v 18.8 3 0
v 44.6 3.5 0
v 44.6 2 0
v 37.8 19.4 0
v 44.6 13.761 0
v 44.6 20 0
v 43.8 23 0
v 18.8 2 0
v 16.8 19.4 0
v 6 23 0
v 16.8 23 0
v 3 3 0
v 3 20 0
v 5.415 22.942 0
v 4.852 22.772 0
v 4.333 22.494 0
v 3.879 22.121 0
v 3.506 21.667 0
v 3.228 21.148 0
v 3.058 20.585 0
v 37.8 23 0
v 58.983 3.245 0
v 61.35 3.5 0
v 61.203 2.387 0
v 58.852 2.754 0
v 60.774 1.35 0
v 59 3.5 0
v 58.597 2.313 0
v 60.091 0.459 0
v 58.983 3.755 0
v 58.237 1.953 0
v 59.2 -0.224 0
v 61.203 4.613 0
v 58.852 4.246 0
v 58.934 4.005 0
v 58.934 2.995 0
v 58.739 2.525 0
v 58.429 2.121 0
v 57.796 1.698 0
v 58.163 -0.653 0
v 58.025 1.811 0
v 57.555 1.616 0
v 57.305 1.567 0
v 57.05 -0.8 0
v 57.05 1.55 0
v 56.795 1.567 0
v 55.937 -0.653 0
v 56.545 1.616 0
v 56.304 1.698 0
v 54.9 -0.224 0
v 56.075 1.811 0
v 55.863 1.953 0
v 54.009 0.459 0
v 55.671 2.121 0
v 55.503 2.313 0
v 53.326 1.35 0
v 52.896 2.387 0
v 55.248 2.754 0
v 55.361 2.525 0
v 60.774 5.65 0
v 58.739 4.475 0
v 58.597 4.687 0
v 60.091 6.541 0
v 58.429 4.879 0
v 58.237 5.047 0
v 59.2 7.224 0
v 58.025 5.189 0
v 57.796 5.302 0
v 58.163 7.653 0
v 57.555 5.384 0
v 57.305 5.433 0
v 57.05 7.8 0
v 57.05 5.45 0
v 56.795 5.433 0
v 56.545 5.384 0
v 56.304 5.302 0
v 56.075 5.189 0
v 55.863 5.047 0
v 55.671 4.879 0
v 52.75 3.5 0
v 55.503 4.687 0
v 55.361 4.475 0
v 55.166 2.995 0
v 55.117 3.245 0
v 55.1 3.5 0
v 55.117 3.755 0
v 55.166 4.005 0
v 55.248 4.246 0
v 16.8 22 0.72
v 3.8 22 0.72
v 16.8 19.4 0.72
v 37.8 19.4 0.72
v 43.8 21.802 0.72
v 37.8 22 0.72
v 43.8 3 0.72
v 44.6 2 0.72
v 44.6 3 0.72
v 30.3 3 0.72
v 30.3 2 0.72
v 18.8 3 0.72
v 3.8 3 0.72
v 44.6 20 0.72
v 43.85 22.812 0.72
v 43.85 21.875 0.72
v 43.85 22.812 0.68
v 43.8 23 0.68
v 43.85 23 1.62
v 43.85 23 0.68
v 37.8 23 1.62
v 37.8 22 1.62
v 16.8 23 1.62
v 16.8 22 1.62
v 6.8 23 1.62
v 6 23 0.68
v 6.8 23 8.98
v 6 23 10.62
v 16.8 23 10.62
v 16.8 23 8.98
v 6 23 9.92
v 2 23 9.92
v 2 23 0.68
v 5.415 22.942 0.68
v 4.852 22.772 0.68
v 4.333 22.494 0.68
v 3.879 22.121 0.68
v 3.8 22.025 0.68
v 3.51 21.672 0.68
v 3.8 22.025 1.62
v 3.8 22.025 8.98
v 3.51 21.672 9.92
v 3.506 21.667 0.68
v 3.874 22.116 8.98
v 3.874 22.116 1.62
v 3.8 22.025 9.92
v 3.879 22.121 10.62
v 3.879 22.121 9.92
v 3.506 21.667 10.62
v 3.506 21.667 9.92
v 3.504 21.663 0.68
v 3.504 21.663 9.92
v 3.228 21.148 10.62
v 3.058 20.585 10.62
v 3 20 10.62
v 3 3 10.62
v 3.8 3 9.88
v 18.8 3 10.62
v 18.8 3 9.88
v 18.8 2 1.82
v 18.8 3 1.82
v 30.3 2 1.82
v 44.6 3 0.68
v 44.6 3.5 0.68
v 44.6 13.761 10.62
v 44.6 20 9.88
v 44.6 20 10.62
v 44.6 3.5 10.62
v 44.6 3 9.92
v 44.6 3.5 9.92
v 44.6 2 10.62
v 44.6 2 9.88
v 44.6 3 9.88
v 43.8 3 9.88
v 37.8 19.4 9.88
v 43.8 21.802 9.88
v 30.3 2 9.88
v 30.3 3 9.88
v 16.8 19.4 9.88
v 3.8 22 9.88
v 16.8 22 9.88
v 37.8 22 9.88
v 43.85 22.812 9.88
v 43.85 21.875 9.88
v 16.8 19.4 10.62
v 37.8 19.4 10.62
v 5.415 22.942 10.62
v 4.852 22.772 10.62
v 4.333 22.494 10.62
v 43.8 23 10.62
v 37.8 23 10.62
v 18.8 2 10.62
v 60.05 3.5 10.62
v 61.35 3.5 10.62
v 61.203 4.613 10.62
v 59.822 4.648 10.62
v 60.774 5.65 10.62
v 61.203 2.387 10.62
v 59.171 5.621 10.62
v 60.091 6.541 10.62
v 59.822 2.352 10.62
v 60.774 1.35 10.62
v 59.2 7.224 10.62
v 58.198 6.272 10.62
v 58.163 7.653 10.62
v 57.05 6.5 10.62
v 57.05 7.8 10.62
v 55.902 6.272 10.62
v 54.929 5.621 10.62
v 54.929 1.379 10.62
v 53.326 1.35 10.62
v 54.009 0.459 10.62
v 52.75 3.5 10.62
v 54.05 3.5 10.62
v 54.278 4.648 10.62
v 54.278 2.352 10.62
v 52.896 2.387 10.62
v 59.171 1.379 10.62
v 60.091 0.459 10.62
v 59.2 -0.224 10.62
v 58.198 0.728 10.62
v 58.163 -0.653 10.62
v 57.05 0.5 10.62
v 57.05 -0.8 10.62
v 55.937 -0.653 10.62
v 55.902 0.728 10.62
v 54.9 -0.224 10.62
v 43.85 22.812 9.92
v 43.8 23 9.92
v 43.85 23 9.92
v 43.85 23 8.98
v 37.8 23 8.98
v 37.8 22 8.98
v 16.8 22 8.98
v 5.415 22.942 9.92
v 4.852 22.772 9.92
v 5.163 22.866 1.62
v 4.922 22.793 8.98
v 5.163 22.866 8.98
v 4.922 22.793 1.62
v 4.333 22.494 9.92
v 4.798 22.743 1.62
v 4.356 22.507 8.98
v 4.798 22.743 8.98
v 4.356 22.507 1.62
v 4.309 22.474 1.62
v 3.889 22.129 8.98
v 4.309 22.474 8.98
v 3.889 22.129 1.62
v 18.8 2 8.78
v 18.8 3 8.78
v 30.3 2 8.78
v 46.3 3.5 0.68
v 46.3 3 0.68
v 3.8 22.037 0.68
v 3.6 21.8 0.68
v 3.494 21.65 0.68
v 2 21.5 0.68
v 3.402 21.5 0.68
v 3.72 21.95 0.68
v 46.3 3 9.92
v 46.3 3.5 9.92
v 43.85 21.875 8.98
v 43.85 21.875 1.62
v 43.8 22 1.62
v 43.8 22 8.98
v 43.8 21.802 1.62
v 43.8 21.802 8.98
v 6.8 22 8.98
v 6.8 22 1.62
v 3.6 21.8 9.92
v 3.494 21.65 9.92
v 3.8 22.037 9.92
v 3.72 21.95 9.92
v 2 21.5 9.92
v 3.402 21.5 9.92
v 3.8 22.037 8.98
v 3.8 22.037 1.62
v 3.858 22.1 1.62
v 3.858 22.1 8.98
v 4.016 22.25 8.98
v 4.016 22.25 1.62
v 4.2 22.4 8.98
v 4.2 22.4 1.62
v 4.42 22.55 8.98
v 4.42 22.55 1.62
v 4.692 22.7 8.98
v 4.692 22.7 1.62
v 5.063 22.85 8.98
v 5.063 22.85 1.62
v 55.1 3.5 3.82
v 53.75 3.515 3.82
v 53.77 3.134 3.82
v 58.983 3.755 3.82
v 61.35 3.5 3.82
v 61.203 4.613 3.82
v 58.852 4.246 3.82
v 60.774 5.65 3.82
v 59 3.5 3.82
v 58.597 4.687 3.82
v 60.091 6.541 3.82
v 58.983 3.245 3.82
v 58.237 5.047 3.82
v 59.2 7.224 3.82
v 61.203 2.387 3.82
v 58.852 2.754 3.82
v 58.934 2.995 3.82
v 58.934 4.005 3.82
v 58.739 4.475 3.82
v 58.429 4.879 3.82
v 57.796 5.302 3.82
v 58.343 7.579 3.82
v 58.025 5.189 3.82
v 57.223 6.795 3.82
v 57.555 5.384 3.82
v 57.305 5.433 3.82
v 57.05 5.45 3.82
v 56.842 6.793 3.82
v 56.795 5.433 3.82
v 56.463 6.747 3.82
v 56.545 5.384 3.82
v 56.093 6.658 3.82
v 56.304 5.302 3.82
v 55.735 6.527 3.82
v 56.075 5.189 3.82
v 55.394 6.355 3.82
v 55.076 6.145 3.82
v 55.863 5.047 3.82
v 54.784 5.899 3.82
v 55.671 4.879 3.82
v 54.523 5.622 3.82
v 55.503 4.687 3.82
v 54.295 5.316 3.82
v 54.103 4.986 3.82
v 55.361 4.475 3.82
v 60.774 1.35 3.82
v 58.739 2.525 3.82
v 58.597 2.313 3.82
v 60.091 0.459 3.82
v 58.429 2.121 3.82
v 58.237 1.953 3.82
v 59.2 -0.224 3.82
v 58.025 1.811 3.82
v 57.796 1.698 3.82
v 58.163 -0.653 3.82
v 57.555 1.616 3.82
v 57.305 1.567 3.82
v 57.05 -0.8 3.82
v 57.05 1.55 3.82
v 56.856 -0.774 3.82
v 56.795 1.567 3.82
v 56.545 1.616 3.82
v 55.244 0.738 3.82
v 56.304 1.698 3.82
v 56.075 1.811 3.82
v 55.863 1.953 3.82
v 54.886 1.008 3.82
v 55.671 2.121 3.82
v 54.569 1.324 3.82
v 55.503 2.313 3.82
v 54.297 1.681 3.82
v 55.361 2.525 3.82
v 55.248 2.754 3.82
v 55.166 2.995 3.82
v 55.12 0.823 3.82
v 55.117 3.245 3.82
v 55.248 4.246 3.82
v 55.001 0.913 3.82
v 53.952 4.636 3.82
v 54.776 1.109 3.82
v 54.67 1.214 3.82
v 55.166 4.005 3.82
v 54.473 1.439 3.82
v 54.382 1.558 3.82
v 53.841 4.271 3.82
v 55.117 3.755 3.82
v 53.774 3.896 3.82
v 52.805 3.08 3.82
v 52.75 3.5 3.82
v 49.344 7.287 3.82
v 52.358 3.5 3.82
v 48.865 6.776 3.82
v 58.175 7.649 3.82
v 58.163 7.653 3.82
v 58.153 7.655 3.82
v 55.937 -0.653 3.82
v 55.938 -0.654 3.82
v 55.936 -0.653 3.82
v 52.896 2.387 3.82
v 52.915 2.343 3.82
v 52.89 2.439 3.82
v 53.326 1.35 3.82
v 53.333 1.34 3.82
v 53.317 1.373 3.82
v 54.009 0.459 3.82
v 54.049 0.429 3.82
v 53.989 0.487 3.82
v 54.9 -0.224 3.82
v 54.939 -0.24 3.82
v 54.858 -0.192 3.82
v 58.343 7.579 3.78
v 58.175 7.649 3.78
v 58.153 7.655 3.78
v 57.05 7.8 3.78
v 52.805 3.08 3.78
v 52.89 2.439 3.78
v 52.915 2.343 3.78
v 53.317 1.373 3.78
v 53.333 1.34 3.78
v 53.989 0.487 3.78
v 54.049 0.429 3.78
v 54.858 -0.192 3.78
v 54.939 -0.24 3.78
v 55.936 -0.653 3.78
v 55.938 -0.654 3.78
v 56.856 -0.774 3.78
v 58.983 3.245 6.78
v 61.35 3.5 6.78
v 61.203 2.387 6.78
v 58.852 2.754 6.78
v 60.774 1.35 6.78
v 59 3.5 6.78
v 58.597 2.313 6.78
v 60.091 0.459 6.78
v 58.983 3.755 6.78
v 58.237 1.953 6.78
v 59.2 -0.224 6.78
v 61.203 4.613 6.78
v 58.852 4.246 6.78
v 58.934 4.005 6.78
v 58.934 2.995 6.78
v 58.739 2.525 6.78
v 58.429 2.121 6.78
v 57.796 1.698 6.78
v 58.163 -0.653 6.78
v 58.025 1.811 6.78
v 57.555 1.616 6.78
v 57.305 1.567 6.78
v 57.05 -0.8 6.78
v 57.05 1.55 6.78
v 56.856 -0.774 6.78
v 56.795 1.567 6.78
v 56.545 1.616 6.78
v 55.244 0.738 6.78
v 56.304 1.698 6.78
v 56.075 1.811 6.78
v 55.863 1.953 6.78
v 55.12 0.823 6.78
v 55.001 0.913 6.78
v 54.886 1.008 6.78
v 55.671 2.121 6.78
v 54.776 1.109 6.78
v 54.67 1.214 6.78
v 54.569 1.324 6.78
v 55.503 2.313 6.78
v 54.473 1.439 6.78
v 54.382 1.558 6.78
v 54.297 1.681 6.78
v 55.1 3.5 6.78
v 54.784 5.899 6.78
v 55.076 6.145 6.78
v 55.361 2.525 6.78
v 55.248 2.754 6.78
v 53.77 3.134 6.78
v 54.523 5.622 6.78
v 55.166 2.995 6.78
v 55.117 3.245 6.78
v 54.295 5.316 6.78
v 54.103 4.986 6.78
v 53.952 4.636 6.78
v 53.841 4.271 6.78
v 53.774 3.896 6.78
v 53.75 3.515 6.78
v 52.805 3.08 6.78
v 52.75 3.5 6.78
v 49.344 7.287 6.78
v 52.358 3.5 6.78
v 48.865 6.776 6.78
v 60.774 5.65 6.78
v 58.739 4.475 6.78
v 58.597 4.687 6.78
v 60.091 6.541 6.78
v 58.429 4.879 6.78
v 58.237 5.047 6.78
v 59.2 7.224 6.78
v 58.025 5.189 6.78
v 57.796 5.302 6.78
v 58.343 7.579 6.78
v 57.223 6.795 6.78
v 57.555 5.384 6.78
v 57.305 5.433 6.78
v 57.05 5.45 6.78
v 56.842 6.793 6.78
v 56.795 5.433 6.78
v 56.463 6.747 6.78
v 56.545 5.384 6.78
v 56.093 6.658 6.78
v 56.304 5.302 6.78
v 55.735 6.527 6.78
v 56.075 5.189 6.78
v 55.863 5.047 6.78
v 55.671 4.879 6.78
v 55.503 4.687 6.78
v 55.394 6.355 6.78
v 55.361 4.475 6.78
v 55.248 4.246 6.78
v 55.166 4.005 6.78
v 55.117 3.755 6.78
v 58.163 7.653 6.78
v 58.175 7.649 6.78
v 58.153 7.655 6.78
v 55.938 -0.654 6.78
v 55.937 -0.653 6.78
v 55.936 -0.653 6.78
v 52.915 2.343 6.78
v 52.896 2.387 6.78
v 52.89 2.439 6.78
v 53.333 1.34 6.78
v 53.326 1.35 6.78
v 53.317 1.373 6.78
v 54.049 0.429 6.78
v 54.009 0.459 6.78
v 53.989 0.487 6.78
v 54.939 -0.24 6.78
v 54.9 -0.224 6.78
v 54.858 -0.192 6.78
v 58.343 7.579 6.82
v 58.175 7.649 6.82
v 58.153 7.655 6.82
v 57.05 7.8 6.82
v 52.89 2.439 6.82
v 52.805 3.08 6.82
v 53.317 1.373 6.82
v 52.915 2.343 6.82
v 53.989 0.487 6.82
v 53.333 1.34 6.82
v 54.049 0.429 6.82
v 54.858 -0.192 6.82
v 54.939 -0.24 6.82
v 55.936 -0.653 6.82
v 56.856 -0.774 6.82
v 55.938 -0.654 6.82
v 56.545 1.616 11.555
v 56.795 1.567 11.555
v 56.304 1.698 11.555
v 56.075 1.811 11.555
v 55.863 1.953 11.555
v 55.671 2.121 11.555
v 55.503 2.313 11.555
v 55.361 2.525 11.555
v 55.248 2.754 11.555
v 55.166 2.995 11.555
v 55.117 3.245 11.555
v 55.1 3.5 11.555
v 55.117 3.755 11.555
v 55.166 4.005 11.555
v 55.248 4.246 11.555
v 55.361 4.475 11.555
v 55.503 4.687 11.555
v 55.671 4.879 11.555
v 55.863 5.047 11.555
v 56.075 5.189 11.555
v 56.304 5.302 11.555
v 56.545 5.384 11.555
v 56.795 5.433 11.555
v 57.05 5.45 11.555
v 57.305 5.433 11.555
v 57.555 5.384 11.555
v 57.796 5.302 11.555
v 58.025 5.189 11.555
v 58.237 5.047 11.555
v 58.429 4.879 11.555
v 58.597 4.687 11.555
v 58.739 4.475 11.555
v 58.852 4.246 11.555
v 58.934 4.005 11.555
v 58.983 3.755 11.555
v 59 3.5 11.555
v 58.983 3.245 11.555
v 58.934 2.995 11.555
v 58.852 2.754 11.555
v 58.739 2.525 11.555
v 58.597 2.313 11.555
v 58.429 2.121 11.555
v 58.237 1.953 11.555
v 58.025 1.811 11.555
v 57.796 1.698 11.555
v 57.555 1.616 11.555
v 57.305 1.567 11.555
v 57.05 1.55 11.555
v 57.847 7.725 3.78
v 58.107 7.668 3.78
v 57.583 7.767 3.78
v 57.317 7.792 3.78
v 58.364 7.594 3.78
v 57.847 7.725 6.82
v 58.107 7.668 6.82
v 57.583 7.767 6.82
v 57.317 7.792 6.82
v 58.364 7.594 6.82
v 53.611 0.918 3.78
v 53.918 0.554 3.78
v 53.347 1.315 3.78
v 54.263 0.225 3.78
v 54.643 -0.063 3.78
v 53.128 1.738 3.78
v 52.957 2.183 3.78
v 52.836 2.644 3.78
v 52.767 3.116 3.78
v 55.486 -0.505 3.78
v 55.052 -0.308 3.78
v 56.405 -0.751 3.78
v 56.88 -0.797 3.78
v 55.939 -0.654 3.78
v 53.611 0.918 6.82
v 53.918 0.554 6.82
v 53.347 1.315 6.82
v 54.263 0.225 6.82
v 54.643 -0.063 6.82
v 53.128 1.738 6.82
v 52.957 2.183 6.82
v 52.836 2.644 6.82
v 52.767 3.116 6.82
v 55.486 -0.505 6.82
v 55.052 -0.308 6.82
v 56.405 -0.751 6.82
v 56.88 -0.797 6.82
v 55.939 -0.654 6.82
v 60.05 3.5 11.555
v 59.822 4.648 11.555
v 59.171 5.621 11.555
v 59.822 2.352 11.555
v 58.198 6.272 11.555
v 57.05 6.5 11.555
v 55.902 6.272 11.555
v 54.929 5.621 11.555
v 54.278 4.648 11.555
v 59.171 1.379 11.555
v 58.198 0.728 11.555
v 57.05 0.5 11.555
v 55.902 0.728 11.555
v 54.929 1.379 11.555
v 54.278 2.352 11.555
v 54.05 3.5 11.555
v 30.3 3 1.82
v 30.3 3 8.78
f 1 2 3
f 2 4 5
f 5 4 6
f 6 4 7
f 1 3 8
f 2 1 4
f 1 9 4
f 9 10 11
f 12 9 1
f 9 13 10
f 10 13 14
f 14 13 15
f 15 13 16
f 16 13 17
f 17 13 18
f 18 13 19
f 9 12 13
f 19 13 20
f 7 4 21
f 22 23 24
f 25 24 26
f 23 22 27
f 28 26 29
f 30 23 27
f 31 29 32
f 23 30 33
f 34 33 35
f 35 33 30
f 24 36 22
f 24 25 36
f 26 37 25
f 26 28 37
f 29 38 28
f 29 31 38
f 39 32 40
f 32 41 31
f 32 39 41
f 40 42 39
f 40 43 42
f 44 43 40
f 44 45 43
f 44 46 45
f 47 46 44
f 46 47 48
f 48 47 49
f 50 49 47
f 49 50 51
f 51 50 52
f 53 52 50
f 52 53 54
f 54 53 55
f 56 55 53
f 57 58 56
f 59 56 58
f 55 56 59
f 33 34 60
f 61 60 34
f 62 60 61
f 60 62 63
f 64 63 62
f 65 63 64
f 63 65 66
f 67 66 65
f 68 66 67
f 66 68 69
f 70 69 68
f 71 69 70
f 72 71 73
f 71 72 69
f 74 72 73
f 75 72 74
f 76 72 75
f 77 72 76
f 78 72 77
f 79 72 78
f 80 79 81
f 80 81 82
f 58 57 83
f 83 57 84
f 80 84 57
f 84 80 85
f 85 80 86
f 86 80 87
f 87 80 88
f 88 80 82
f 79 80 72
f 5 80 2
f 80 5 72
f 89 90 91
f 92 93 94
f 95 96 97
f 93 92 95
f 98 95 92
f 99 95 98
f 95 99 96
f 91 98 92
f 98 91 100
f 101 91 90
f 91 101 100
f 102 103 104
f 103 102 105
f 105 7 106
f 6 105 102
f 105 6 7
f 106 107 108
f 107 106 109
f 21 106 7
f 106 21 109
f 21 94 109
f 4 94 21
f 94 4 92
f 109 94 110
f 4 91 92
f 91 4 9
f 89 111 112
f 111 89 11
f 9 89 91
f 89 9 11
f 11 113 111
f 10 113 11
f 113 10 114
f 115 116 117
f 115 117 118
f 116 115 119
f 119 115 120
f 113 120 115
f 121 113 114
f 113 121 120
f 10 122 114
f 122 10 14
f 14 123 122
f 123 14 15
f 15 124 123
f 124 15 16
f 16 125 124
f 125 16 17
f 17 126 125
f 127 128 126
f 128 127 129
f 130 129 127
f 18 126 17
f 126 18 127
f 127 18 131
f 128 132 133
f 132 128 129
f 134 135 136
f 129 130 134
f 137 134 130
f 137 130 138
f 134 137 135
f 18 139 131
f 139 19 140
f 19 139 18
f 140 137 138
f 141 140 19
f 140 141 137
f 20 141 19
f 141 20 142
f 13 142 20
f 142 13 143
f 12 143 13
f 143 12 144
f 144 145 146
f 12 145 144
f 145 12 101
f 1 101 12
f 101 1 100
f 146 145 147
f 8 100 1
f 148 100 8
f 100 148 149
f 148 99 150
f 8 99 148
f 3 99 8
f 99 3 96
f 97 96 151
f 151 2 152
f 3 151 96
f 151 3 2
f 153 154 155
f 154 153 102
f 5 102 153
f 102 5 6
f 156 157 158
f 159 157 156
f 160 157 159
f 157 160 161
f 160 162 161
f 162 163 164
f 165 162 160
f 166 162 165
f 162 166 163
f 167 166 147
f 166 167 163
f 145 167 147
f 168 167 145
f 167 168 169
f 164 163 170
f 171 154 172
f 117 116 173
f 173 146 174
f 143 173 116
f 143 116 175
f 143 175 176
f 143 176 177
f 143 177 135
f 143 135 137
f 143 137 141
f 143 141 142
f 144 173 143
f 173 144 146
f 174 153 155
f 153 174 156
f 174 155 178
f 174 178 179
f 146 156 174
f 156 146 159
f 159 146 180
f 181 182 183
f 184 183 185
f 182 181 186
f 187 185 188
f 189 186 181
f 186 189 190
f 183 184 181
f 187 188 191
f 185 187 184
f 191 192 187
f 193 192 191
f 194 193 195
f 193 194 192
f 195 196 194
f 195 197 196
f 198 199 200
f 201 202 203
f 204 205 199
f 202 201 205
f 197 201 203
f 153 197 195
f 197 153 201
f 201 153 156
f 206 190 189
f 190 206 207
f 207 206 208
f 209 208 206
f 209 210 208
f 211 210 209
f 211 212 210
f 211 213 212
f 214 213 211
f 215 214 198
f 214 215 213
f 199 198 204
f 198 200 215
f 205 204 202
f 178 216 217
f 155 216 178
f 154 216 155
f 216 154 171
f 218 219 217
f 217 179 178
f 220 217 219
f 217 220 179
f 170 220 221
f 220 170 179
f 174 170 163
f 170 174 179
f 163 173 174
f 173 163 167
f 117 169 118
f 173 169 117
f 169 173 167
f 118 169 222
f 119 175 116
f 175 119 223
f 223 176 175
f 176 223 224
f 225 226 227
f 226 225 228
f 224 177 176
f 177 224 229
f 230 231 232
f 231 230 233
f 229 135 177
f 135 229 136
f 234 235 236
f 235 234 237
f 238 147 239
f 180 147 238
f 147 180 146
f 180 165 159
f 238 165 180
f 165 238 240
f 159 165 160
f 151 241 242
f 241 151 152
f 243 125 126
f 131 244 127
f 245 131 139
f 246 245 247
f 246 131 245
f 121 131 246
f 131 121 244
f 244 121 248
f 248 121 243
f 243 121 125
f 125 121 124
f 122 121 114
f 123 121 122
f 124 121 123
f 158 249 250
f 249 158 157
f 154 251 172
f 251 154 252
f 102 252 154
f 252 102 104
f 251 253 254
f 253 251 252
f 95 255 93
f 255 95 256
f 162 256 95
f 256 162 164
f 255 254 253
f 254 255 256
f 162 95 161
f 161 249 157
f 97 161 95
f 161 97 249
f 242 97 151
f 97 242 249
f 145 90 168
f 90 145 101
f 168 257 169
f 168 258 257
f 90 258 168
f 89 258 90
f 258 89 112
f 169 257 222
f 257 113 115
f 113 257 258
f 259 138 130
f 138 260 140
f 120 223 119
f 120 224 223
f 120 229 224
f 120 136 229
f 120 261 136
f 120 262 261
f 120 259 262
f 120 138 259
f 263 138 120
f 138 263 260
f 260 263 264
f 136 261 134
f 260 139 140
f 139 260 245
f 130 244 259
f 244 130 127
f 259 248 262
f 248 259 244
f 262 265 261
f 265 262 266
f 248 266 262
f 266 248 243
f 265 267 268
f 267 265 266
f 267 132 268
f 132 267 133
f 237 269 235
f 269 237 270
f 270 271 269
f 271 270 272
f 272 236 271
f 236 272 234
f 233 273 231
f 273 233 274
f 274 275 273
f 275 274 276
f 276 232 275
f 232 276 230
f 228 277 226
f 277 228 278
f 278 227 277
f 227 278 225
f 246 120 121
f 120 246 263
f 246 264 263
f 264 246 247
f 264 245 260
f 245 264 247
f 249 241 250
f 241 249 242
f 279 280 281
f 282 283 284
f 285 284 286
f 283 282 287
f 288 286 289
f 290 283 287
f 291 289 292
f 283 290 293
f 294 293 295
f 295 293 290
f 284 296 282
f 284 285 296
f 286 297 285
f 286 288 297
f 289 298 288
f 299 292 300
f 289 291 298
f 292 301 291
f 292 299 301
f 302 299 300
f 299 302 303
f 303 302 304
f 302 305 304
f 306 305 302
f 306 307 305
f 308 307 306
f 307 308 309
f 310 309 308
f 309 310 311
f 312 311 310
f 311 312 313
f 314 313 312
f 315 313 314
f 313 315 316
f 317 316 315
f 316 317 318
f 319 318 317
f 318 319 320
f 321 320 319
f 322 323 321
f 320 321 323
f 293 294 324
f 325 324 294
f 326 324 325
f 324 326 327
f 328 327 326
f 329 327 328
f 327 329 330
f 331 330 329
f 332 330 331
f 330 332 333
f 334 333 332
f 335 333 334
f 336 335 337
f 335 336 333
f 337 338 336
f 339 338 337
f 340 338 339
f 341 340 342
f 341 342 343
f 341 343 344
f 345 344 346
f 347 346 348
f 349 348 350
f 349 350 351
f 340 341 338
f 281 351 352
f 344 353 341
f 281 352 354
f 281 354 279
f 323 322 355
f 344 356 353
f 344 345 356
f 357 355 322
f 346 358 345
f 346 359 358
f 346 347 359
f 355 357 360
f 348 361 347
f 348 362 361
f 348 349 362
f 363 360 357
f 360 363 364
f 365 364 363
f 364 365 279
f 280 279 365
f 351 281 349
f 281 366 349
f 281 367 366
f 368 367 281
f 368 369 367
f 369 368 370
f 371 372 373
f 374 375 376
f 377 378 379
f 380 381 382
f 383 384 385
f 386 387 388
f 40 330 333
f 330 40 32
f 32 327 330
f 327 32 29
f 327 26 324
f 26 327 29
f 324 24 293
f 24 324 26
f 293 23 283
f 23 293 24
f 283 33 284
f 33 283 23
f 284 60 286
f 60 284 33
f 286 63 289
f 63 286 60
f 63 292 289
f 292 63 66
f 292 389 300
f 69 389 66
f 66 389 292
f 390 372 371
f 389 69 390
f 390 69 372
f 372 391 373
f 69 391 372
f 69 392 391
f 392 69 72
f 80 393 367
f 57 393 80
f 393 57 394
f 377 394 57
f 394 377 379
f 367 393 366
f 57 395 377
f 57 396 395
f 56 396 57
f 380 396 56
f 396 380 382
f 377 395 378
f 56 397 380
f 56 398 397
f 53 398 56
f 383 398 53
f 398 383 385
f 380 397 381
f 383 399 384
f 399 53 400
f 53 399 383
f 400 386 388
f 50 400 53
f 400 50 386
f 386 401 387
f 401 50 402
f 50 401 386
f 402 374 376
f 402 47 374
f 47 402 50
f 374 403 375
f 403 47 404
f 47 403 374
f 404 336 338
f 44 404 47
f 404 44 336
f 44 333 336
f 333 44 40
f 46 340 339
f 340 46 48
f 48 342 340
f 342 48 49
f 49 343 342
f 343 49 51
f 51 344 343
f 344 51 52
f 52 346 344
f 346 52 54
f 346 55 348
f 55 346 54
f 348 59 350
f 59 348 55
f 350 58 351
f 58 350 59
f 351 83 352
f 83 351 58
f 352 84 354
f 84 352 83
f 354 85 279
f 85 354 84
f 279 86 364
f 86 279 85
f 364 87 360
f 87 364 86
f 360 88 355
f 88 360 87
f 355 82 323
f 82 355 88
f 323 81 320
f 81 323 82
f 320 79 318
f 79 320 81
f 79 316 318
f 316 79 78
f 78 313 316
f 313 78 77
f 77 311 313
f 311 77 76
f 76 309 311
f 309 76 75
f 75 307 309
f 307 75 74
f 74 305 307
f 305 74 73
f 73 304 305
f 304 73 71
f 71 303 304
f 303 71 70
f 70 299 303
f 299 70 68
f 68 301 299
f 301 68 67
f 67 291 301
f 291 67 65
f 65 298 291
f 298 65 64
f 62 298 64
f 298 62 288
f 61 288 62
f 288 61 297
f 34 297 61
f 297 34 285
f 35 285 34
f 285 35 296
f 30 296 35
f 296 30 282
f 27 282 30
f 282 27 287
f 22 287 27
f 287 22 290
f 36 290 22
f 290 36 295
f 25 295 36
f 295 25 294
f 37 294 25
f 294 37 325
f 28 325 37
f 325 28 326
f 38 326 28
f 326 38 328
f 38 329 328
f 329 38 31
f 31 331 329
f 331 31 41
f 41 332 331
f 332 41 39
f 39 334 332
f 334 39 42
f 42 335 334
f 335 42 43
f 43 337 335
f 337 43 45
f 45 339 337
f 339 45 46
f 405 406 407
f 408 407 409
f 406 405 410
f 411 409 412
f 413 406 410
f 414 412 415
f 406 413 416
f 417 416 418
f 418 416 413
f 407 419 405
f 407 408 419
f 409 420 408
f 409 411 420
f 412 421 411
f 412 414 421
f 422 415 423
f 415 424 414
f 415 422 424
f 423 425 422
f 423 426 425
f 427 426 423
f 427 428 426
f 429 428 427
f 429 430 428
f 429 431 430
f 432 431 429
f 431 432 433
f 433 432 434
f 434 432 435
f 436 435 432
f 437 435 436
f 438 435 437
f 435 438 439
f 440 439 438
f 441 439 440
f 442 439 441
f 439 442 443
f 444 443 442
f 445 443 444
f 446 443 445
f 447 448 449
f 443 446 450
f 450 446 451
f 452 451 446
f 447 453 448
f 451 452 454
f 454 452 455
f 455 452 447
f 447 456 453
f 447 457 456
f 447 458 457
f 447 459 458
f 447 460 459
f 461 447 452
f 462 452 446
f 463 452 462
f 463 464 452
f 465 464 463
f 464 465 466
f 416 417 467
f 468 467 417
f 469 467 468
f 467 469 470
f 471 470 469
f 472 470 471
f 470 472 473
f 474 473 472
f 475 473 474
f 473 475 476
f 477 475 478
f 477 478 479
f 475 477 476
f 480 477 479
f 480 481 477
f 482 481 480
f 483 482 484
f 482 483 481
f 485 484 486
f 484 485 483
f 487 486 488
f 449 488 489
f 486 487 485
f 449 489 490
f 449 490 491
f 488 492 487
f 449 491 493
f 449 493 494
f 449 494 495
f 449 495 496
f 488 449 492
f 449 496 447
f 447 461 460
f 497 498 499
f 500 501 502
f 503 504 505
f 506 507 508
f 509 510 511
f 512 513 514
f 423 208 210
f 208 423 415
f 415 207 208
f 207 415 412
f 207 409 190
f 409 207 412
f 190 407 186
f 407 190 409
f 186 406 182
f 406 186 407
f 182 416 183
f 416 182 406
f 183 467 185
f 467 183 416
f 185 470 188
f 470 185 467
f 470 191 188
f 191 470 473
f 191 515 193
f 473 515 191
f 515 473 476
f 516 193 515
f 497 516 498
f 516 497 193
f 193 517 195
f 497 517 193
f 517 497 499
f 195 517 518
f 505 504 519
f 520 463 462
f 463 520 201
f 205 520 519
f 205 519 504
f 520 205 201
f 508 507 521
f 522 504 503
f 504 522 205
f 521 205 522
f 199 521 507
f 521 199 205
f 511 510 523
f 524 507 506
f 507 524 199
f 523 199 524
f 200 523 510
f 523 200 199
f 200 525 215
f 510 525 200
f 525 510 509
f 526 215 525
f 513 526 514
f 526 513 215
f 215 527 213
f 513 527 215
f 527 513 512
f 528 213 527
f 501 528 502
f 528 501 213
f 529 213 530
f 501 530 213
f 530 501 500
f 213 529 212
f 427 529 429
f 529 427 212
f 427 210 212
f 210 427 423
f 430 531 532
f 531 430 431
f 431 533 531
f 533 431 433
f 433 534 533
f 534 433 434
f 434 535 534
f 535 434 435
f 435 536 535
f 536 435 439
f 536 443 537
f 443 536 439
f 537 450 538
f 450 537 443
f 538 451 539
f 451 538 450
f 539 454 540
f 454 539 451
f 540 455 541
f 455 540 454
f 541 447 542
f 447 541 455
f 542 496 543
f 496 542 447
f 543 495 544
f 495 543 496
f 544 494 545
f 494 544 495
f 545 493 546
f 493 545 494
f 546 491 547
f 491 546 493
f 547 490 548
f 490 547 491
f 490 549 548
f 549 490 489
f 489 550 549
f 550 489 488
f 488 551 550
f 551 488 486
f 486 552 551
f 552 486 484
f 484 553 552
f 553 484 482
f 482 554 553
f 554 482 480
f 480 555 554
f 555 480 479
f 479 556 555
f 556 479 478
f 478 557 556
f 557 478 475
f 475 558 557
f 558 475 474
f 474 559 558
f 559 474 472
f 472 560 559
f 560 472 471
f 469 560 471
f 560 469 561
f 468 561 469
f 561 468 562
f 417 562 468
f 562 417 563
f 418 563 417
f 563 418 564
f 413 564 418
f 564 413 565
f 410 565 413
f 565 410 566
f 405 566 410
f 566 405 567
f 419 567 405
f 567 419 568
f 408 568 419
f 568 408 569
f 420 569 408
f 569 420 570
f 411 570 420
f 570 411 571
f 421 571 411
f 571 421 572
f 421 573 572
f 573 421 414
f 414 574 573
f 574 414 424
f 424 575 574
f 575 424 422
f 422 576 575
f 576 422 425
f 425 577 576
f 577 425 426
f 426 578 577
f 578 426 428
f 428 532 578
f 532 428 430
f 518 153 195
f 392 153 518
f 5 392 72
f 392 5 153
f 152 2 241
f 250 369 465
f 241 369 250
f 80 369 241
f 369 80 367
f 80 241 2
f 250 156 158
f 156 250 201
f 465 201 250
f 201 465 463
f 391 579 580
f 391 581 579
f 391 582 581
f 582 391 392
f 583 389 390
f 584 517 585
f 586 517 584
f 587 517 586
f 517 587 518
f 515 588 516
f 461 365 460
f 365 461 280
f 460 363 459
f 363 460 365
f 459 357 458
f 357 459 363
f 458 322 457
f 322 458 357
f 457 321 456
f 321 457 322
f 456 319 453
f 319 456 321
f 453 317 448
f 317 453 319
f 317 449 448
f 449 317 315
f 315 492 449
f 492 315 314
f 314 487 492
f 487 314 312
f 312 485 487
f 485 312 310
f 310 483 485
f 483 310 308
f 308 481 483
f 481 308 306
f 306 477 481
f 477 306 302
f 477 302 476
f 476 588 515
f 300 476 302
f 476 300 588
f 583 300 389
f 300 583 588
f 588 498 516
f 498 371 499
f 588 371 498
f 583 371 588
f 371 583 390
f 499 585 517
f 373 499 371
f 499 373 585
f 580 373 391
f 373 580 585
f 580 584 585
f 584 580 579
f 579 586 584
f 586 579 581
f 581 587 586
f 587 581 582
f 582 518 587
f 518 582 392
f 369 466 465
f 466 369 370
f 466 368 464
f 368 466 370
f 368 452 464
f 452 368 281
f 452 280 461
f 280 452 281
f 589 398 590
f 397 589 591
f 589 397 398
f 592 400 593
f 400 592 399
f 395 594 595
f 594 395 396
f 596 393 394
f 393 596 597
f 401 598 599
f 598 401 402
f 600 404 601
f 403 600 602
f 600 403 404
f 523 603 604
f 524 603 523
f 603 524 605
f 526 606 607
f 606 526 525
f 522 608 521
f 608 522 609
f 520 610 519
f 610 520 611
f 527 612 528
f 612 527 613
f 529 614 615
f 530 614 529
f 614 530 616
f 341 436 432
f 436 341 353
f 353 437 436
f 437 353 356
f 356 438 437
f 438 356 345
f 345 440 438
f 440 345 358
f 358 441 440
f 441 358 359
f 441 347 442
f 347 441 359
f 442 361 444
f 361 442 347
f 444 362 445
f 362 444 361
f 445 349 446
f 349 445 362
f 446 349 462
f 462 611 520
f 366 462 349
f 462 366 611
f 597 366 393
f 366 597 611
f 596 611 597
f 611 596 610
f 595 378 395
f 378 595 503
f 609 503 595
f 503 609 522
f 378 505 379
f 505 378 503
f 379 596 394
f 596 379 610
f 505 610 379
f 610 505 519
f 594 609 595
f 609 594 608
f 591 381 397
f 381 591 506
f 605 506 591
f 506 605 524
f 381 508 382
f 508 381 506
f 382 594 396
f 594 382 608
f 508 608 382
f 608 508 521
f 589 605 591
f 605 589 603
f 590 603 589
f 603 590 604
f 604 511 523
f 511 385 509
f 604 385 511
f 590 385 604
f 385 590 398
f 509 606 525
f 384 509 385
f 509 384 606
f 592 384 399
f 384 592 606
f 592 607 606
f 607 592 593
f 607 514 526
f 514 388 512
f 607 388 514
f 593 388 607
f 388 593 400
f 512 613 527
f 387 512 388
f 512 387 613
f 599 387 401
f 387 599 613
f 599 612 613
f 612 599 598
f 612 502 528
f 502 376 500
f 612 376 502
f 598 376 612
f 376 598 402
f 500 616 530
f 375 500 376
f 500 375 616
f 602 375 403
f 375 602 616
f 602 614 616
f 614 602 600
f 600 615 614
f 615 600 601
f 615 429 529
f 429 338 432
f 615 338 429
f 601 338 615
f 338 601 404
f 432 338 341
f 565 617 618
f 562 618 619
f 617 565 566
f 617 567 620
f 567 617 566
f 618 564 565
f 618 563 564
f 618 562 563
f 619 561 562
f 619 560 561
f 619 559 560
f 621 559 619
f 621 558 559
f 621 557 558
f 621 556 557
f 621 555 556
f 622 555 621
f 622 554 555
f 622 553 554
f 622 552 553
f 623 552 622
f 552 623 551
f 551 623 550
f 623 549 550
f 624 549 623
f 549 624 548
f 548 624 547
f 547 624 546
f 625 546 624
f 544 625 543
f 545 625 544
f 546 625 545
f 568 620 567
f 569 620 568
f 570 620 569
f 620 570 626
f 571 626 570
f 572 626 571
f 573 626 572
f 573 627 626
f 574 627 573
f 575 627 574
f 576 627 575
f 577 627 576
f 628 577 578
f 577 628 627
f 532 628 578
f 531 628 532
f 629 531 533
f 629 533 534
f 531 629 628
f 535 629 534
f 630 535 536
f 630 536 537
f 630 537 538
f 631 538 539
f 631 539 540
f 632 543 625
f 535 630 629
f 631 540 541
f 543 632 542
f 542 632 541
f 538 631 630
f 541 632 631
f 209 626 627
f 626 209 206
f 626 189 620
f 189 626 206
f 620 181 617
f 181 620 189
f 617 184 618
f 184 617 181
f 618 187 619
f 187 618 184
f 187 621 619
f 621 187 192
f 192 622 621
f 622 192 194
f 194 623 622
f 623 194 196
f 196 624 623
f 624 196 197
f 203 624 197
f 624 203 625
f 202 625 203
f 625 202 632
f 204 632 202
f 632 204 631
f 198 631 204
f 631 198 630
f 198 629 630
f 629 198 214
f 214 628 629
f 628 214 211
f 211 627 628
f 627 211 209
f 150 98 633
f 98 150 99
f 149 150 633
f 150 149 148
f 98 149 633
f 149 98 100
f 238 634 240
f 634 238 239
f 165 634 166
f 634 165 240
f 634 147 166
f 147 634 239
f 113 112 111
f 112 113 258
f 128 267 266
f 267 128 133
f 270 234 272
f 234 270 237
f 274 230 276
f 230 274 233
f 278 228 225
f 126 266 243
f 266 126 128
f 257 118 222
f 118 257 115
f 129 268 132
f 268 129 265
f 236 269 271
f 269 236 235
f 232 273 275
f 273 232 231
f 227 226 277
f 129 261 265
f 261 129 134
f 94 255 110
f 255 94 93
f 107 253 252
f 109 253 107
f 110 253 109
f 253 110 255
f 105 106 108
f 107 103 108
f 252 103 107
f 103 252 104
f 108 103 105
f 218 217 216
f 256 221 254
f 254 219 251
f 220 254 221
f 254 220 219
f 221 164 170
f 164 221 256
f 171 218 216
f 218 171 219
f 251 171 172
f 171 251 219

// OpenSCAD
// Toccata stage-0 C16a - 레버 캐리어 (C 자리, 생산 부품 그대로, 3개) (generated by make_stage0.py; print orientation, z = build direction)
$fn = 64;
union(){
translate([0,0,0.0000]) linear_extrude(height=0.7200) difference(){polygon([[3.0000,3.0000],[18.8000,3.0000],[18.8000,2.0000],[44.6000,2.0000],[44.6000,20.0000],[43.8000,23.0000],[37.8000,23.0000],[37.8000,19.4000],[16.8000,19.4000],[16.8000,23.0000],[6.0000,23.0000],[5.4147,22.9424],[4.8519,22.7716],[4.3333,22.4944],[3.8787,22.1213],[3.5056,21.6667],[3.2284,21.1481],[3.0576,20.5853],[3.0000,20.0000]]); translate([57.0500,3.5000]) circle(d=3.9, $fn=48);}
translate([0,0,9.8800]) linear_extrude(height=0.7400) difference(){polygon([[3.0000,3.0000],[18.8000,3.0000],[18.8000,2.0000],[44.6000,2.0000],[44.6000,20.0000],[43.8000,23.0000],[37.8000,23.0000],[37.8000,19.4000],[16.8000,19.4000],[16.8000,23.0000],[6.0000,23.0000],[5.4147,22.9424],[4.8519,22.7716],[4.3333,22.4944],[3.8787,22.1213],[3.5056,21.6667],[3.2284,21.1481],[3.0576,20.5853],[3.0000,20.0000]]); translate([57.0500,3.5000]) circle(d=3.9, $fn=48);}
translate([0,0,0.6800]) linear_extrude(height=9.2400) difference(){polygon([[3.0000,3.0000],[44.6000,3.0000],[44.6000,20.0000],[43.8000,22.0000],[6.8000,22.0000],[6.8000,23.0000],[6.0000,23.0000],[5.4147,22.9424],[4.8519,22.7716],[4.3333,22.4944],[3.8787,22.1213],[3.5056,21.6667],[3.2284,21.1481],[3.0576,20.5853],[3.0000,20.0000]]); translate([57.0500,3.5000]) circle(d=3.9, $fn=48);translate([3.8000,3.0000]) square([40.0000,19.0000]);}
translate([0,0,0.6800]) linear_extrude(height=9.2400) difference(){polygon([[2.0000,21.5000],[3.4019,21.5000],[3.4945,21.6500],[3.6000,21.8000],[3.7202,21.9500],[3.8576,22.1000],[4.0157,22.2500],[4.2000,22.4000],[4.4197,22.5500],[4.6923,22.7000],[5.0633,22.8500],[6.0000,23.0000],[2.0000,23.0000]]); translate([57.0500,3.5000]) circle(d=3.9, $fn=48);}
translate([0,0,0.6800]) linear_extrude(height=9.2400) difference(){polygon([[44.6000,3.0000],[46.3000,3.0000],[46.3000,4.5000],[44.6000,4.5000]]); translate([57.0500,3.5000]) circle(d=3.9, $fn=48);}
translate([0,0,0.0000]) linear_extrude(height=3.8200) difference(){polygon([[61.3500,3.5000],[61.2035,4.6129],[60.7739,5.6500],[60.0906,6.5406],[59.2000,7.2239],[58.1629,7.6535],[57.0500,7.8000],[55.9371,7.6535],[54.9000,7.2239],[54.0094,6.5406],[53.3261,5.6500],[52.8965,4.6129],[52.7500,3.5000],[52.8965,2.3871],[53.3261,1.3500],[54.0094,0.4594],[54.9000,-0.2239],[55.9371,-0.6535],[57.0500,-0.8000],[58.1629,-0.6535],[59.2000,-0.2239],[60.0906,0.4594],[60.7739,1.3500],[61.2035,2.3871]]); translate([57.0500,3.5000]) circle(d=3.9, $fn=48);}
translate([0,0,6.7800]) linear_extrude(height=3.8400) difference(){polygon([[61.3500,3.5000],[61.2035,4.6129],[60.7739,5.6500],[60.0906,6.5406],[59.2000,7.2239],[58.1629,7.6535],[57.0500,7.8000],[55.9371,7.6535],[54.9000,7.2239],[54.0094,6.5406],[53.3261,5.6500],[52.8965,4.6129],[52.7500,3.5000],[52.8965,2.3871],[53.3261,1.3500],[54.0094,0.4594],[54.9000,-0.2239],[55.9371,-0.6535],[57.0500,-0.8000],[58.1629,-0.6535],[59.2000,-0.2239],[60.0906,0.4594],[60.7739,1.3500],[61.2035,2.3871]]); translate([57.0500,3.5000]) circle(d=3.9, $fn=48);}
translate([0,0,0.0000]) linear_extrude(height=3.8200) difference(){polygon([[44.1000,3.5000],[44.1000,14.0000],[57.0500,7.8000],[57.0500,3.5000]]); translate([57.0500,3.5000]) circle(d=3.9, $fn=48);}
translate([0,0,6.7800]) linear_extrude(height=3.8400) difference(){polygon([[44.1000,3.5000],[44.1000,14.0000],[57.0500,7.8000],[57.0500,3.5000]]); translate([57.0500,3.5000]) circle(d=3.9, $fn=48);}
translate([0,0,3.7800]) linear_extrude(height=3.0400) difference(){polygon([[58.3642,7.5942],[58.1075,7.6679],[57.8467,7.7255],[57.5829,7.7669],[57.3169,7.7917],[57.0500,7.8000],[44.1000,14.0000],[44.1000,3.5000],[52.3576,3.5000],[48.8653,6.7763],[49.3443,7.2868],[53.7703,3.1345],[53.7500,3.5153],[53.7738,3.8959],[53.8414,4.2712],[53.9518,4.6362],[54.1035,4.9861],[54.2947,5.3161],[54.5226,5.6218],[54.7842,5.8992],[55.0762,6.1446],[55.3944,6.3547],[55.7348,6.5266],[56.0928,6.6581],[56.4635,6.7475],[56.8421,6.7934],[57.2234,6.7954]]); translate([57.0500,3.5000]) circle(d=3.9, $fn=48);}
translate([0,0,3.7800]) linear_extrude(height=3.0400) difference(){polygon([[52.7672,3.1157],[52.8360,2.6441],[52.9567,2.1830],[53.1276,1.7380],[53.3467,1.3148],[53.6113,0.9183],[53.9181,0.5536],[54.2634,0.2251],[54.6430,-0.0632],[55.0521,-0.3077],[55.4858,-0.5054],[55.9387,-0.6539],[56.4053,-0.7514],[56.8797,-0.7966],[55.2437,0.7382],[55.1205,0.8229],[55.0013,0.9130],[54.8862,1.0084],[54.7756,1.1089],[54.6697,1.2144],[54.5686,1.3245],[54.4727,1.4391],[54.3820,1.5579],[54.2968,1.6807]]); translate([57.0500,3.5000]) circle(d=3.9, $fn=48);}
translate([0,0,10.5800]) linear_extrude(height=0.9750) difference(){polygon([[60.0500,3.5000],[59.8216,4.6481],[59.1713,5.6213],[58.1981,6.2716],[57.0500,6.5000],[55.9019,6.2716],[54.9287,5.6213],[54.2784,4.6481],[54.0500,3.5000],[54.2784,2.3519],[54.9287,1.3787],[55.9019,0.7284],[57.0500,0.5000],[58.1981,0.7284],[59.1713,1.3787],[59.8216,2.3519]]); translate([57.0500,3.5000]) circle(d=3.9, $fn=48);}
translate([0,0,0.6800]) linear_extrude(height=1.1400) difference(){polygon([[18.8000,2.0000],[30.3000,2.0000],[30.3000,3.0000],[18.8000,3.0000]]); translate([57.0500,3.5000]) circle(d=3.9, $fn=48);}
translate([0,0,8.7800]) linear_extrude(height=1.1400) difference(){polygon([[18.8000,2.0000],[30.3000,2.0000],[30.3000,3.0000],[18.8000,3.0000]]); translate([57.0500,3.5000]) circle(d=3.9, $fn=48);}
translate([0,0,0.6800]) linear_extrude(height=0.9400) difference(){polygon([[3.8000,22.0000],[16.8000,22.0000],[16.8000,23.0000],[3.8000,23.0000]]); translate([57.0500,3.5000]) circle(d=3.9, $fn=48);}
translate([0,0,8.9800]) linear_extrude(height=0.9400) difference(){polygon([[3.8000,22.0000],[16.8000,22.0000],[16.8000,23.0000],[3.8000,23.0000]]); translate([57.0500,3.5000]) circle(d=3.9, $fn=48);}
translate([0,0,0.6800]) linear_extrude(height=0.9400) difference(){polygon([[37.8000,22.0000],[43.8500,21.8000],[43.8500,23.0000],[37.8000,23.0000]]); translate([57.0500,3.5000]) circle(d=3.9, $fn=48);}
translate([0,0,8.9800]) linear_extrude(height=0.9400) difference(){polygon([[37.8000,22.0000],[43.8500,21.8000],[43.8500,23.0000],[37.8000,23.0000]]); translate([57.0500,3.5000]) circle(d=3.9, $fn=48);}
}
